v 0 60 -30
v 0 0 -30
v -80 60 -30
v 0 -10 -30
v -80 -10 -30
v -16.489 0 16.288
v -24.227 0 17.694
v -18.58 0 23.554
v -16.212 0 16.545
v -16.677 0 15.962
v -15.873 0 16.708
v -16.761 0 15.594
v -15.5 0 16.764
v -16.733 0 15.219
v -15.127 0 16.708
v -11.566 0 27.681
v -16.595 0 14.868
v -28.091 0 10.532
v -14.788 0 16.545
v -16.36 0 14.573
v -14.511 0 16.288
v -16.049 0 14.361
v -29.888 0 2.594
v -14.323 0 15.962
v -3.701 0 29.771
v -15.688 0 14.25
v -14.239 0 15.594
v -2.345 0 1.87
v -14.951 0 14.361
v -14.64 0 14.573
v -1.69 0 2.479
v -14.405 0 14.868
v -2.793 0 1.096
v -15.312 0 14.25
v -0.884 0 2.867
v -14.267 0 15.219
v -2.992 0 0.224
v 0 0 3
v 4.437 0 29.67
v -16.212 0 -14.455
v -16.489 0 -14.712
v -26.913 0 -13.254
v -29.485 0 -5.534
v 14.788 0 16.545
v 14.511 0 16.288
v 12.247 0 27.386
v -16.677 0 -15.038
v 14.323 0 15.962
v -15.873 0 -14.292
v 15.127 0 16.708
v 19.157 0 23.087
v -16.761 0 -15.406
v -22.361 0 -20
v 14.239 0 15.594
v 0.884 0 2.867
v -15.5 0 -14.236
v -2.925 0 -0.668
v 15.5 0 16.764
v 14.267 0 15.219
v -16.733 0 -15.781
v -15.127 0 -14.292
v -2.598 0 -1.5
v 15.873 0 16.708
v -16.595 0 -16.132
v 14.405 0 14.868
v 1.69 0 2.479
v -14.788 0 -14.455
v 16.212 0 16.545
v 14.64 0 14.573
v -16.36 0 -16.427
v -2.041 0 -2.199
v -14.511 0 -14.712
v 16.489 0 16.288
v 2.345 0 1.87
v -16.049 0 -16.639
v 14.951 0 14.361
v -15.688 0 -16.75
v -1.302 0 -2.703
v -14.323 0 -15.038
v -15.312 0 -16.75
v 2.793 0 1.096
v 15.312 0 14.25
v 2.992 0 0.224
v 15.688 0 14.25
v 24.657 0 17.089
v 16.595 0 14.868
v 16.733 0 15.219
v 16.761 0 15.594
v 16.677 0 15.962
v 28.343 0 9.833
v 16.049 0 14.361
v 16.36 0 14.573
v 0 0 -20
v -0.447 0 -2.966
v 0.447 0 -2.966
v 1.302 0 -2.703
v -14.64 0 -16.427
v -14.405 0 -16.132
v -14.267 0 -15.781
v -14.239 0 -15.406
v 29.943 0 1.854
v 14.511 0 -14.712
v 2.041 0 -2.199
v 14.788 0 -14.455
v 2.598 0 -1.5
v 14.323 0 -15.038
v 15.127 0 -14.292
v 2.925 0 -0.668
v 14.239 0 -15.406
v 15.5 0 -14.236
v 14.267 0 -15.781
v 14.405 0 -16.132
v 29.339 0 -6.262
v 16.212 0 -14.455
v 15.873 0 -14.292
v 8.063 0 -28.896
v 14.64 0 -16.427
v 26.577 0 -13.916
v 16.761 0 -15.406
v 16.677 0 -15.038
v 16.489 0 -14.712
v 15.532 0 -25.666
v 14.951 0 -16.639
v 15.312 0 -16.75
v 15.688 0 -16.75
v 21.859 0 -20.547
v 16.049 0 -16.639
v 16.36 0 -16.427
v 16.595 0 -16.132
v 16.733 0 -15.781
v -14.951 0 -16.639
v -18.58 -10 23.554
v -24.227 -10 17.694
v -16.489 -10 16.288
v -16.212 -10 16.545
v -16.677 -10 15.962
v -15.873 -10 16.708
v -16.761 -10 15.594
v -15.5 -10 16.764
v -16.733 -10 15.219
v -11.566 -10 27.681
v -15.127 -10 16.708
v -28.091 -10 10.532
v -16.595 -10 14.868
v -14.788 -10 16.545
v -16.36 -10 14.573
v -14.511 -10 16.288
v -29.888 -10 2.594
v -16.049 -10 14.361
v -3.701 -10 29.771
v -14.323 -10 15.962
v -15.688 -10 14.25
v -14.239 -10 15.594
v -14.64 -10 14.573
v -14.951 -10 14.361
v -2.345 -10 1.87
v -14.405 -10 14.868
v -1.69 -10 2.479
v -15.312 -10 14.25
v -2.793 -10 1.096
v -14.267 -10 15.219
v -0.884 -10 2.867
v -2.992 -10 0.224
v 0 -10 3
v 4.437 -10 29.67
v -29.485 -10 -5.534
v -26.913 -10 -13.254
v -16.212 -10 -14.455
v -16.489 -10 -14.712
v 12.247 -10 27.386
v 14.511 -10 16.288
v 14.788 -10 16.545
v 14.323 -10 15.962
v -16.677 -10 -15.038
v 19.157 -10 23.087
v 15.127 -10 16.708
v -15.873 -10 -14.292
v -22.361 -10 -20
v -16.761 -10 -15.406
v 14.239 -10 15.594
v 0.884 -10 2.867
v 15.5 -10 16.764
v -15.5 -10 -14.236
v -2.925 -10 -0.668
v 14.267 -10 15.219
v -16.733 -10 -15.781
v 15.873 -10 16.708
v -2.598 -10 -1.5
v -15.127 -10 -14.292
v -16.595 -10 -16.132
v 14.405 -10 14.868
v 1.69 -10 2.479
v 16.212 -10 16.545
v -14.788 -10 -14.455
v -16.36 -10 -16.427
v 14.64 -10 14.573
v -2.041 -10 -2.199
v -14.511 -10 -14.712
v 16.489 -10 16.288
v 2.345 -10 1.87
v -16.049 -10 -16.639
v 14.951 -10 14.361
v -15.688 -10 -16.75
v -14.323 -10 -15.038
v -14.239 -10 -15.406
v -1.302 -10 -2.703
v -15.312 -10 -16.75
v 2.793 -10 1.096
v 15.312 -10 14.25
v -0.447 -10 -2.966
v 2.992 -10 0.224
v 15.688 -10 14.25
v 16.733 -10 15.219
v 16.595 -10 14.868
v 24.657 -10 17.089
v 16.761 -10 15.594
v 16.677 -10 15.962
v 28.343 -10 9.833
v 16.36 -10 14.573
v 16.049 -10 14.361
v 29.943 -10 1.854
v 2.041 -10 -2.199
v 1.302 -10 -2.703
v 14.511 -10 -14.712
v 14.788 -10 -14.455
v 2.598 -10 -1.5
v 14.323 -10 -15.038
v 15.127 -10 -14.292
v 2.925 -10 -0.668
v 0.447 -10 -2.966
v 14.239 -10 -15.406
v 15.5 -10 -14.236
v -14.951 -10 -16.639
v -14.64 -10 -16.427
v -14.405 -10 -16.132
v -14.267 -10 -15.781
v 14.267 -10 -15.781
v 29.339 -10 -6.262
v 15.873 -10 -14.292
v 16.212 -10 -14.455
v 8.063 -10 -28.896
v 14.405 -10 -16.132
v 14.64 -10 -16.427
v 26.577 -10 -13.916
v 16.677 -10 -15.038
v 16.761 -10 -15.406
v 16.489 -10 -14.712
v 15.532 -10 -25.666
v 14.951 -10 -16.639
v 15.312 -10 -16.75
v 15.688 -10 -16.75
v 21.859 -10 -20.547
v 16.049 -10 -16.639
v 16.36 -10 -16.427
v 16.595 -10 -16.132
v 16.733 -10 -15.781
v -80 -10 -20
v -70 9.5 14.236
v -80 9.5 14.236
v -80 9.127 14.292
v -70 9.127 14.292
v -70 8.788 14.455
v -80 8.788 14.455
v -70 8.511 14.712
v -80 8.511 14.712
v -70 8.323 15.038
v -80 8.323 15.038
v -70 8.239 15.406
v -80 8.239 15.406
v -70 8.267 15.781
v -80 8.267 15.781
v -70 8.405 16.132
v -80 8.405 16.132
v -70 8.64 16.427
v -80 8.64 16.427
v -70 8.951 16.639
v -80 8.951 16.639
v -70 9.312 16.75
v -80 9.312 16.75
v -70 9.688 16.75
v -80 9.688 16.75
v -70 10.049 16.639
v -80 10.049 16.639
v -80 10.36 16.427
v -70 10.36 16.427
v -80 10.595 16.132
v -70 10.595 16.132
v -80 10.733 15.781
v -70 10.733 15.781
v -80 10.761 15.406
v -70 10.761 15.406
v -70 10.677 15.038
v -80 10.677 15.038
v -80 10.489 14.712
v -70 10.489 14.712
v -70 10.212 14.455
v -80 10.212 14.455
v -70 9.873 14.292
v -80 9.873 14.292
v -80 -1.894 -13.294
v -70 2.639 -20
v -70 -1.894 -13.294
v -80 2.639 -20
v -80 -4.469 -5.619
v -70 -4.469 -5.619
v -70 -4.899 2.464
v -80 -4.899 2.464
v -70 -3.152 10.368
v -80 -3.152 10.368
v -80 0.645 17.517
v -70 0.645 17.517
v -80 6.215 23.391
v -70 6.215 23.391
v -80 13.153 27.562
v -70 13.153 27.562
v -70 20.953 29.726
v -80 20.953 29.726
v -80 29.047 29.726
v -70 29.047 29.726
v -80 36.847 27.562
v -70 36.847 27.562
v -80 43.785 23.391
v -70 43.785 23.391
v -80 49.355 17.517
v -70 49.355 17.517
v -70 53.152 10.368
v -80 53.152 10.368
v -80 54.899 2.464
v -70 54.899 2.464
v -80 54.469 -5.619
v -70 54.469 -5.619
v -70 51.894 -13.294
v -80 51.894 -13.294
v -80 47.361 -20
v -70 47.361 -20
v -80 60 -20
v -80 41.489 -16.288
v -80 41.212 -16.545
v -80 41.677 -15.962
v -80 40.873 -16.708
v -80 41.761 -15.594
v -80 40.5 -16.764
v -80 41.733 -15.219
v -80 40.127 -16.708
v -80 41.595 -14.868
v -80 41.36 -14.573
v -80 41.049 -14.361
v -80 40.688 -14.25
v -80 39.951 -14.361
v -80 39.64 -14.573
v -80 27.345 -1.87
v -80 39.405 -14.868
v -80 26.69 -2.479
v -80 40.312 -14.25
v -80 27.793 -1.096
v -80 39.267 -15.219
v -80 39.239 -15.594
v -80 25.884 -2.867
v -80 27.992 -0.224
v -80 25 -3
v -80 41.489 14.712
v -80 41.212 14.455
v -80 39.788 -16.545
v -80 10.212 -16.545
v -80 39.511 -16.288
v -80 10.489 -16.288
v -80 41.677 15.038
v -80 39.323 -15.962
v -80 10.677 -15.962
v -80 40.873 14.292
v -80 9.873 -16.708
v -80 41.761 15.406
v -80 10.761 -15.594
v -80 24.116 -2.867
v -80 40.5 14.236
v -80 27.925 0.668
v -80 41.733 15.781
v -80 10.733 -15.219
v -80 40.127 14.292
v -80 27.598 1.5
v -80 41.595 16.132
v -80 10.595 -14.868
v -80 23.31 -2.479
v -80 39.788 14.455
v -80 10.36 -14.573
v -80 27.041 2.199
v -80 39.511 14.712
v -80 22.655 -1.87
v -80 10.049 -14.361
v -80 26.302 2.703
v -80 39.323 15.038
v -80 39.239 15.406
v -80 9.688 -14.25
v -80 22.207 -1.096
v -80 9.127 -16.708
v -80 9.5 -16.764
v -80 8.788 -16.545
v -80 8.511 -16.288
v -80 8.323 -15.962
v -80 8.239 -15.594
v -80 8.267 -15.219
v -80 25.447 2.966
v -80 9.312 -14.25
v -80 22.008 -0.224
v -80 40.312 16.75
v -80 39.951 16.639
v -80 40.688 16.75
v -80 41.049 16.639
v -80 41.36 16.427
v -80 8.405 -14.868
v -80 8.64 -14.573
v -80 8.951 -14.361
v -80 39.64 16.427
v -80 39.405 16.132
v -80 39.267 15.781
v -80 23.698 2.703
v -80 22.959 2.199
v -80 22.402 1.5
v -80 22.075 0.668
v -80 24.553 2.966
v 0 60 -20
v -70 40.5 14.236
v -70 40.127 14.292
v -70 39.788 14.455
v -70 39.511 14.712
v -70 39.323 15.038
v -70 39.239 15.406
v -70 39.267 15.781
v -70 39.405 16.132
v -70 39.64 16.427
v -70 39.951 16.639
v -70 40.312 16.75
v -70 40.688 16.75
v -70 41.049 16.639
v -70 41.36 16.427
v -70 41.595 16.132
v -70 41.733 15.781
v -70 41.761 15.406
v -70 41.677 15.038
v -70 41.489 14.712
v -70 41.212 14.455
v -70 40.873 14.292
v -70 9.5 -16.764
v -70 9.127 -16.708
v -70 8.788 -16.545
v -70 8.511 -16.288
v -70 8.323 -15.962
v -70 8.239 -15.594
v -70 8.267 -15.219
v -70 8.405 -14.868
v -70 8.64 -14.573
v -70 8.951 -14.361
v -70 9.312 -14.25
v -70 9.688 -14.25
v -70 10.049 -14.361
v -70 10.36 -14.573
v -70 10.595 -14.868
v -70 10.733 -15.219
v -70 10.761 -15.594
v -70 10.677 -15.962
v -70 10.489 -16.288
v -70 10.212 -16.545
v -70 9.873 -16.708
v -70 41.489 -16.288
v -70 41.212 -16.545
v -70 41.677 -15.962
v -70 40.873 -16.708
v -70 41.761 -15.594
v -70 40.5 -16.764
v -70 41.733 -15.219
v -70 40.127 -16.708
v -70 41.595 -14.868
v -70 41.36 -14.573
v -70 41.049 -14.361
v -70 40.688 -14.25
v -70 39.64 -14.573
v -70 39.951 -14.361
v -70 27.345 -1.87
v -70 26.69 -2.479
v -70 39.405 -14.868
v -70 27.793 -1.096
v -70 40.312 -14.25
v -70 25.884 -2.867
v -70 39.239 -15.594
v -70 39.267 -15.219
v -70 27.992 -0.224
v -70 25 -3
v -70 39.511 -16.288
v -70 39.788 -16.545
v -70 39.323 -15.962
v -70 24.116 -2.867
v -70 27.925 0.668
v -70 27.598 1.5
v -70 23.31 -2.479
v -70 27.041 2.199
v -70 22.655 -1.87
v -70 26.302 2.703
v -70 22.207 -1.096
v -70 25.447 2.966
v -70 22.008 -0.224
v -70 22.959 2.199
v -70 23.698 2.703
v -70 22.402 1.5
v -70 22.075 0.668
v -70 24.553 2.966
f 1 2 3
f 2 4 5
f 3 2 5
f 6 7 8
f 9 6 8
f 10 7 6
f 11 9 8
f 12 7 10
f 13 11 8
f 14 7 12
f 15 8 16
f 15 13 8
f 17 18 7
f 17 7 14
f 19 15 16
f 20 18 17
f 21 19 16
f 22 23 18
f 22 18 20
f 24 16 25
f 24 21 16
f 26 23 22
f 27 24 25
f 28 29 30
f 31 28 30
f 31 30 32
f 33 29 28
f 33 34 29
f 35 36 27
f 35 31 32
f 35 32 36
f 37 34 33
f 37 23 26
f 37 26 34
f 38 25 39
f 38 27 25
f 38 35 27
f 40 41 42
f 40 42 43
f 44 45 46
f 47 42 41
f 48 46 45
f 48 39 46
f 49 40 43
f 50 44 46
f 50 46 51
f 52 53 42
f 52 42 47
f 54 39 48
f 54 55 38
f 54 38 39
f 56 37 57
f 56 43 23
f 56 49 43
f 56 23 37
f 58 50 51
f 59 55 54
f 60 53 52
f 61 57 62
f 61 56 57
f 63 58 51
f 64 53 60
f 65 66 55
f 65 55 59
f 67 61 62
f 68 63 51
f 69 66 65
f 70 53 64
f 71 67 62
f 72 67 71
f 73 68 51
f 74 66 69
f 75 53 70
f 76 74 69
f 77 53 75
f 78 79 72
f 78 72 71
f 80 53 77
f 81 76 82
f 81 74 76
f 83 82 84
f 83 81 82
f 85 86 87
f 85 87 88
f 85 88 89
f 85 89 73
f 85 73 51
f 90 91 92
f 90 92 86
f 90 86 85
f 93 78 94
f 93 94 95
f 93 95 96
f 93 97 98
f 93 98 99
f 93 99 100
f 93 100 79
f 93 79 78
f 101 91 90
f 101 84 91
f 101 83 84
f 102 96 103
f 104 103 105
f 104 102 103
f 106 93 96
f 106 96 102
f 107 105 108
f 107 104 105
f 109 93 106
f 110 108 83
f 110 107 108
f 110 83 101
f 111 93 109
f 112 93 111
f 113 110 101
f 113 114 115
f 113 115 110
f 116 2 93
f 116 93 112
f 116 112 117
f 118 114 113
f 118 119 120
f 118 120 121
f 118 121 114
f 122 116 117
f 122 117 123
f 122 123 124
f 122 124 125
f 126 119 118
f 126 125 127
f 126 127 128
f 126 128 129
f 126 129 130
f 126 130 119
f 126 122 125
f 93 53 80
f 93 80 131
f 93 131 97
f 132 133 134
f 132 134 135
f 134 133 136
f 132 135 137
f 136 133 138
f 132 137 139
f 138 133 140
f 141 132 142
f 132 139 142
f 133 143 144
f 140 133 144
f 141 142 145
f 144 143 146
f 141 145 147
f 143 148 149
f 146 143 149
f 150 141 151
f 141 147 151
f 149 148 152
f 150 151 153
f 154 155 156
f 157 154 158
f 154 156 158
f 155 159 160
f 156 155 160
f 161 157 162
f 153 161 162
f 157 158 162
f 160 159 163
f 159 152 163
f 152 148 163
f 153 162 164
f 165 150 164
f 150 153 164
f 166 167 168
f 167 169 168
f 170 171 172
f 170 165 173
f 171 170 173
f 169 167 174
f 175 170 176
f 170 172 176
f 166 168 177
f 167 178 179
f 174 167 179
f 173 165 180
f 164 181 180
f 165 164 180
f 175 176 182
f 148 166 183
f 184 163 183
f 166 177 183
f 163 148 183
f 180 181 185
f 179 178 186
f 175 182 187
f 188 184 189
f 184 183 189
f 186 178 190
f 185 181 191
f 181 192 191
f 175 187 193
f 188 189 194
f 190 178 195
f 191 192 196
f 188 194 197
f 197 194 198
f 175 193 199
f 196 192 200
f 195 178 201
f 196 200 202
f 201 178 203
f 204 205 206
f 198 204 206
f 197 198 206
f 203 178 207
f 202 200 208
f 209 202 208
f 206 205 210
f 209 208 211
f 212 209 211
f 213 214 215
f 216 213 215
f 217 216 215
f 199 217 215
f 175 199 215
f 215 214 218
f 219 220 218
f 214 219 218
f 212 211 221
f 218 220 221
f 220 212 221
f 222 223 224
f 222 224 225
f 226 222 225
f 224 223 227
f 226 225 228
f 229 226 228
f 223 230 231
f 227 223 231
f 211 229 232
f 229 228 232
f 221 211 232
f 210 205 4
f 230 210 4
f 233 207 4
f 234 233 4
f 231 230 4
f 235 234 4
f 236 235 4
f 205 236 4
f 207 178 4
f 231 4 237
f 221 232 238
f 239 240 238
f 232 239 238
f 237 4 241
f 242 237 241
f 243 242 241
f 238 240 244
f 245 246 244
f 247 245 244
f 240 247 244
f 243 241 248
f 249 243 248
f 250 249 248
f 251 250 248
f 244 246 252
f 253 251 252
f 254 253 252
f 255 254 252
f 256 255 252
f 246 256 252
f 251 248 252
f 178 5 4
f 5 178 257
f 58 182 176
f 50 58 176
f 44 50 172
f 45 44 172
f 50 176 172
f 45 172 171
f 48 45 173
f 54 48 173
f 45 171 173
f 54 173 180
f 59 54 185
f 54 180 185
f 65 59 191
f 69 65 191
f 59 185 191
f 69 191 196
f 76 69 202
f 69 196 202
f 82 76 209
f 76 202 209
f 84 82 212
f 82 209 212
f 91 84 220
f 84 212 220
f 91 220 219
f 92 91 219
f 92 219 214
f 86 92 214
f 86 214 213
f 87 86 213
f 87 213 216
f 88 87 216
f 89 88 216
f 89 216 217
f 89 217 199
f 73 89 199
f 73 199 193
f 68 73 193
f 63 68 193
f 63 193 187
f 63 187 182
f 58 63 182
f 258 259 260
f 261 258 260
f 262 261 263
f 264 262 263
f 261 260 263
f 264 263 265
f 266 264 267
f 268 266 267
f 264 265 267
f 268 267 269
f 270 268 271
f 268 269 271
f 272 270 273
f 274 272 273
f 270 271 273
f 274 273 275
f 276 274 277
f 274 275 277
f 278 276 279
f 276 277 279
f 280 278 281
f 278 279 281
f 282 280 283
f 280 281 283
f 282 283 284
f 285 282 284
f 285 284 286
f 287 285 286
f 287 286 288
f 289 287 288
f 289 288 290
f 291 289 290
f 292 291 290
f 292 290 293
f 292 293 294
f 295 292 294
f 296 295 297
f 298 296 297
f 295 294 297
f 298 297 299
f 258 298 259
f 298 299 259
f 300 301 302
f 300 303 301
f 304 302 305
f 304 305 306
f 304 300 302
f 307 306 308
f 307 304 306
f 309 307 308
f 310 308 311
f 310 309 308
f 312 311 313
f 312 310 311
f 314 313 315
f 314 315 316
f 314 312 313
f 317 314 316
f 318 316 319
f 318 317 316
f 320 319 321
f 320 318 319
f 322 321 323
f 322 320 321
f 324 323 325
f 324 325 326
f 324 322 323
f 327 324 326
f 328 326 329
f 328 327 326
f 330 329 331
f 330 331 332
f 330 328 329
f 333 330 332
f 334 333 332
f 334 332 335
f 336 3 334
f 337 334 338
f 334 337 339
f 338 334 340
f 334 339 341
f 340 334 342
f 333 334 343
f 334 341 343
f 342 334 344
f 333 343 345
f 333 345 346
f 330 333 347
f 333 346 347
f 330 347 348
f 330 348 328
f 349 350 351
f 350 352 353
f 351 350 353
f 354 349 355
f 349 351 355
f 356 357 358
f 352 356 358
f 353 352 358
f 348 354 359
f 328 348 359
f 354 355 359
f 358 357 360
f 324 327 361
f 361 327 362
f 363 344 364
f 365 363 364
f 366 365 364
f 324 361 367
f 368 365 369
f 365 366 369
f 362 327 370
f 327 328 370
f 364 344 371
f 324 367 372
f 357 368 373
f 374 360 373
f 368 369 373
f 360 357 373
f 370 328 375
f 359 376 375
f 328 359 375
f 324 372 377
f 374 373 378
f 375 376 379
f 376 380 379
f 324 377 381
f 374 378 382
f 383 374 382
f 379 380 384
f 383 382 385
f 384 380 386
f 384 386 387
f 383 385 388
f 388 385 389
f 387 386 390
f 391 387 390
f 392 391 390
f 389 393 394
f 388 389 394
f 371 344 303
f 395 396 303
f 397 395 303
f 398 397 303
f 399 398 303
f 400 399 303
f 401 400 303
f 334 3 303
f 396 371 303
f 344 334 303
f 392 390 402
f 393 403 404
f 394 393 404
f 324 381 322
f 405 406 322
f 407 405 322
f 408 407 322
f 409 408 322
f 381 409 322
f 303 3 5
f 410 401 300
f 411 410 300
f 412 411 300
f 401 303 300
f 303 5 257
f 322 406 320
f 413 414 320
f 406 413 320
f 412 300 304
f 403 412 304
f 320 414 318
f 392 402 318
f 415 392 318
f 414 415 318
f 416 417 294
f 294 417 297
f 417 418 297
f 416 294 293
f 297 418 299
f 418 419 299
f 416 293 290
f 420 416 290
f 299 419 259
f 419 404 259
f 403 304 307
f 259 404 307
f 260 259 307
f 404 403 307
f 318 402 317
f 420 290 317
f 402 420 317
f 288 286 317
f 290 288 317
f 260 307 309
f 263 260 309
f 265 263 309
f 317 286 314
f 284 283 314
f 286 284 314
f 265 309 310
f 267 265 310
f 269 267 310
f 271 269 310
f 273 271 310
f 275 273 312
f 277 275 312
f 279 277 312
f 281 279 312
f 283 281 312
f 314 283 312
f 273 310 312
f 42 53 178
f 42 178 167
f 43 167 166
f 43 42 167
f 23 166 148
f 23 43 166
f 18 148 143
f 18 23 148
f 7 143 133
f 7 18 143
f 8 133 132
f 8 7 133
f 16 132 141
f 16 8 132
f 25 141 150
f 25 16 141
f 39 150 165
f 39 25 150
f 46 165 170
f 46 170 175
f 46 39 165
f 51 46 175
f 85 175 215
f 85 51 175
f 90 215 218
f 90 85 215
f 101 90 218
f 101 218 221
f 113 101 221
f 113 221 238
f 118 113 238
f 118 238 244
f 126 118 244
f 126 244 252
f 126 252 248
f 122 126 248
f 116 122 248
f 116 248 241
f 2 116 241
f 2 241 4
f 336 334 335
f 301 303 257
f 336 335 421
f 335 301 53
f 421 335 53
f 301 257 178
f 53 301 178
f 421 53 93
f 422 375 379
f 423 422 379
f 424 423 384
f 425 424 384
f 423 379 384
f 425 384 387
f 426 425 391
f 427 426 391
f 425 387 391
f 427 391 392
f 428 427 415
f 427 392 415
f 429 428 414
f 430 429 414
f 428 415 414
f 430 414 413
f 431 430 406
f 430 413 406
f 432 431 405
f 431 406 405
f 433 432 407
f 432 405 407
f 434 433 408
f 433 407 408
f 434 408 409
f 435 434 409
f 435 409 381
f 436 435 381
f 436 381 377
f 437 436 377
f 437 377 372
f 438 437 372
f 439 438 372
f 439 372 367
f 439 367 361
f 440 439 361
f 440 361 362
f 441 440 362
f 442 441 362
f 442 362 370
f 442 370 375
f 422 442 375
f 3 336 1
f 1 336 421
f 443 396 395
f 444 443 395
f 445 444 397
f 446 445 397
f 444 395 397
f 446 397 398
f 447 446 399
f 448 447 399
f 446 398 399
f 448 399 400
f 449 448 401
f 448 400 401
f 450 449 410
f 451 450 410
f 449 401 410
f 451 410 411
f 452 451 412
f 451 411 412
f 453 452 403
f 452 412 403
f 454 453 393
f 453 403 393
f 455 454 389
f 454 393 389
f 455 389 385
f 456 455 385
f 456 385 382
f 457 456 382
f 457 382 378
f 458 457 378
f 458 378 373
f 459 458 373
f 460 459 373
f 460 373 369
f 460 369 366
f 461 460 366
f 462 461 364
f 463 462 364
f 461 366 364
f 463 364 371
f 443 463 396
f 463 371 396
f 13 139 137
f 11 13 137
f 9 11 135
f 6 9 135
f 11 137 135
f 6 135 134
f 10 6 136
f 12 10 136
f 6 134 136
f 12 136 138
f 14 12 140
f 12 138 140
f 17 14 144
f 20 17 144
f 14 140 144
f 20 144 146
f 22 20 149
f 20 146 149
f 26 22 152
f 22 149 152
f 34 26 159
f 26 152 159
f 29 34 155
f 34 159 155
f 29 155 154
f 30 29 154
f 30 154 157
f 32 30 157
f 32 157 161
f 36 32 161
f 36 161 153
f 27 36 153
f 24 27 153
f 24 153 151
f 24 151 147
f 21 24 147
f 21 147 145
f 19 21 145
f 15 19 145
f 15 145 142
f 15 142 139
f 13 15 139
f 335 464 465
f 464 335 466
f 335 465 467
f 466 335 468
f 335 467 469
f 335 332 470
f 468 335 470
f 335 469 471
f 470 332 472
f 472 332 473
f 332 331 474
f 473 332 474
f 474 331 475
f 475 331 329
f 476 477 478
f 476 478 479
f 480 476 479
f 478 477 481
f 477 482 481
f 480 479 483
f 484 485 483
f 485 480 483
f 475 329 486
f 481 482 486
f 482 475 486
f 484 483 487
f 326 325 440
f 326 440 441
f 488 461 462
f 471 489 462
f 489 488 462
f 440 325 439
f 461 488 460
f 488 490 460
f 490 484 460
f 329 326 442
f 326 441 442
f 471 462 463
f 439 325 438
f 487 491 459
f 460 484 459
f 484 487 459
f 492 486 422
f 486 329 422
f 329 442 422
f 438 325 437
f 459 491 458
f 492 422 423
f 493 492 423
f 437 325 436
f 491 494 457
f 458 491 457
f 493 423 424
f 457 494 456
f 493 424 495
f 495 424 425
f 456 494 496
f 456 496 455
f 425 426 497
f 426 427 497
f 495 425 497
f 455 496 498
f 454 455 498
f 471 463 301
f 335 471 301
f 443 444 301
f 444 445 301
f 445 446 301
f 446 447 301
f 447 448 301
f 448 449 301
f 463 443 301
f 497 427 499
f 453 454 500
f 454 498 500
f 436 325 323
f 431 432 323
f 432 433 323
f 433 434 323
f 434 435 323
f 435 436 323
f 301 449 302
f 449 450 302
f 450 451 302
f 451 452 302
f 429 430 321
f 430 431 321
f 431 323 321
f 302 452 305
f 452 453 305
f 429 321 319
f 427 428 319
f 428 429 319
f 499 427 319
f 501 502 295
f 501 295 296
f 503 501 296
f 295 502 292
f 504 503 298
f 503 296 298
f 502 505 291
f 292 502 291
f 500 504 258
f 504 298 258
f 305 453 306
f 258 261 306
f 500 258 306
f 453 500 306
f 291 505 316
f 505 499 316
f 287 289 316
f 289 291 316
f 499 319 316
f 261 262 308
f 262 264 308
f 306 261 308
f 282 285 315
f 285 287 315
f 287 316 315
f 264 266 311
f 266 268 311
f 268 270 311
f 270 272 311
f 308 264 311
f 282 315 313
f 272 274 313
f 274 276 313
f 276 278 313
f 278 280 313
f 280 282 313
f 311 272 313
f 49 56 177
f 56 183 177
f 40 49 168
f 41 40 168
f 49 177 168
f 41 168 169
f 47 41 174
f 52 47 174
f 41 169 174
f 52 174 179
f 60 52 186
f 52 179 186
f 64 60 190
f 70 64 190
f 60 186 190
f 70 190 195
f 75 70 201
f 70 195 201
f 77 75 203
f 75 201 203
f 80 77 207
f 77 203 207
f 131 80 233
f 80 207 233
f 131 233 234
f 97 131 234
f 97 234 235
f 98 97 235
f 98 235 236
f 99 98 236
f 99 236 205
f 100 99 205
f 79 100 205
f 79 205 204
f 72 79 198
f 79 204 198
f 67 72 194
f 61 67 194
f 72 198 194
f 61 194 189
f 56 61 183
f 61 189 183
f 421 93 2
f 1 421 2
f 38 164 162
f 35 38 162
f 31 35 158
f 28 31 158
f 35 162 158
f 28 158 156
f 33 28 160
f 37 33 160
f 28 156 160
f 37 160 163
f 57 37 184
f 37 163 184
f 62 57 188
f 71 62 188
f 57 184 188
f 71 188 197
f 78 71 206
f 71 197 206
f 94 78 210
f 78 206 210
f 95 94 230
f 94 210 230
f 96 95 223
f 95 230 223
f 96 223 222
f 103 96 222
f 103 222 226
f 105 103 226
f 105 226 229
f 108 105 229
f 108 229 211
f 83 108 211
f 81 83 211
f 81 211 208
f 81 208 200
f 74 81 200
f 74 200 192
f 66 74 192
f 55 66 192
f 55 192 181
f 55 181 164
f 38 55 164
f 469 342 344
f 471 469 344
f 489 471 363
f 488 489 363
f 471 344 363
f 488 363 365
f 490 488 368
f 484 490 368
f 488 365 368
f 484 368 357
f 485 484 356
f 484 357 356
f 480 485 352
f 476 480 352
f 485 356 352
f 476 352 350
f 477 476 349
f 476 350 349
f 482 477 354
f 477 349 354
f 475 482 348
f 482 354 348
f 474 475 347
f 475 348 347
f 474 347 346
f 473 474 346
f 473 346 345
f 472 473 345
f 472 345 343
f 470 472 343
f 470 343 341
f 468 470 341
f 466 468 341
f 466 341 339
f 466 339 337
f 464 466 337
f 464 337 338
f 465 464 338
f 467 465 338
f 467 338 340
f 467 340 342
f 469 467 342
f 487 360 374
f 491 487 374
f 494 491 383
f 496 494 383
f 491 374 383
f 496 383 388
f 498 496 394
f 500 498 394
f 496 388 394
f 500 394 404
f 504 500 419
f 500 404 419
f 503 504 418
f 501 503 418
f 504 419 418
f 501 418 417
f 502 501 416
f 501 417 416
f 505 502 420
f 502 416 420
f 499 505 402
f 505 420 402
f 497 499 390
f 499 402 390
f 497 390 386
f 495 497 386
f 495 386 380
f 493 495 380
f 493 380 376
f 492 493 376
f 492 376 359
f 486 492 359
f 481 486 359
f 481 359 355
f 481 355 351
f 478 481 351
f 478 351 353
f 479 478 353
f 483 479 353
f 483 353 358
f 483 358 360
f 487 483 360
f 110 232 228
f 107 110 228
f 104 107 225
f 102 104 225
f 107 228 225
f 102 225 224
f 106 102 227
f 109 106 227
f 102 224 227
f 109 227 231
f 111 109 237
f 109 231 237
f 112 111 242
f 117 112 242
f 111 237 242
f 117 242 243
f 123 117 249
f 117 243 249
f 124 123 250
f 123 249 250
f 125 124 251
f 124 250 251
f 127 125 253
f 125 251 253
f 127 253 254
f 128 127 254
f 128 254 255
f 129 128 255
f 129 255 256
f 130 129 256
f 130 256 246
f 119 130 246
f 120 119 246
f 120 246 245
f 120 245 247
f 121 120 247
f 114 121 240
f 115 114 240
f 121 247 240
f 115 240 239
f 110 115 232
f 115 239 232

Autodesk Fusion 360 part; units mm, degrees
sketch "Sketch1" plane through (0, 0, 0) normal (0, 1, 0) x (1, 0, 0)
  circle A0 centre (0, 0) radius 30
  dimension "d1" = 60
extrude "Extrude1" add sketch "Sketch1" against normal blind 10
sketch "Sketch2" plane through (0, -10, 0) normal (0, -1, 0) x (1, 0, 0)
  circle A0 centre (0, 0) radius 30
  line L0 (0, -30) -> (-80, -30)
  line L1 (-80, -30) -> (-80, -20)
  line L2 (-80, -20) -> (0, -20)
  line L3 (0, -20) -> (0, -30)
  dimension "d4" = 80
  dimension "d5" = 10
extrude "Extrude2" add sketch "Sketch2" against normal blind 70 contours A0 L0 L1 L2 | A0 L2 L3 picked at (-1.3972, -26.5686)
sketch "Sketch3" plane through (-80, 0, 0) normal (-1, 0, 0) x (0, -1, 0)
  line L0 (10, -30) -> (10, -20)
  line L1 (10, -20) -> (-60, -20)
  line L2 (-60, -20) -> (-60, -30)
  line L3 (-60, -30) -> (10, -30)
  circle A0 centre (-25, 0) radius 30
  line L4 (-25, 0) -> (-25, -30) construction
  dimension "d8" = 60
extrude "Extrude3" add sketch "Sketch3" against normal blind 10 contours L1 A0 picked at (-17.2718, 11.3343)
sketch "Sketch4" plane through (0, 0, 0) normal (0, 1, 0) x (-1, 0, 0)
  line L0 (0, -30) -> (0, -20)
  line L1 (0, -20) -> (22.3607, -20)
  arc A0 (22.3607, -20) -> (0, -30) centre (0, 0) ccw
  line L2 (-15.5, 15.5) -> (15.5, 15.5)
  line L3 (15.5, 15.5) -> (15.5, -15.5)
  line L4 (15.5, -15.5) -> (-15.5, -15.5)
  line L5 (-15.5, -15.5) -> (-15.5, 15.5)
  line L6 (-15.5, 15.5) -> (15.5, -15.5) construction
  line L7 (15.5, 15.5) -> (-15.5, -15.5) construction
  dimension "d11" = 31
  dimension "d12" = 31
hole "Hole1" at (15.5, 0, 15.5) at (-15.5, 0, 15.5) at (15.5, 0, -15.5) at (-15.5, 0, -15.5) direction (0, -1, 0) diameter 2.529 depth 10 tip angle 118
hole "Hole2" at (0, 0, 0) direction (0, -1, 0) diameter 6 depth 10 tip angle 118
sketch "Sketch5" plane through (-70, 0, 0) normal (1, 0, 0) x (0, 1, 0)
  arc A0 (47.3607, -20) -> (2.6393, -20) centre (25, 0) ccw
  line L0 (2.6393, -20) -> (47.3607, -20)
  line L1 (9.5, 15.5) -> (40.5, 15.5)
  line L2 (40.5, 15.5) -> (40.5, -15.5)
  line L3 (40.5, -15.5) -> (9.5, -15.5)
  line L4 (9.5, -15.5) -> (9.5, 15.5)
  line L5 (9.5, 15.5) -> (40.5, -15.5) construction
  line L6 (40.5, 15.5) -> (9.5, -15.5) construction
  point P0 (25, 0)
  dimension "d21" = 31
  dimension "d22" = 31
hole "Hole3" at (-70, 9.5, 15.5) at (-70, 40.5, 15.5) at (-70, 9.5, -15.5) at (-70, 40.5, -15.5) direction (-1, 0, 0) diameter 2.529 depth 10 tip angle 118
hole "Hole4" at (-70, 25, 0) direction (-1, 0, 0) diameter 6 depth 10 tip angle 118
